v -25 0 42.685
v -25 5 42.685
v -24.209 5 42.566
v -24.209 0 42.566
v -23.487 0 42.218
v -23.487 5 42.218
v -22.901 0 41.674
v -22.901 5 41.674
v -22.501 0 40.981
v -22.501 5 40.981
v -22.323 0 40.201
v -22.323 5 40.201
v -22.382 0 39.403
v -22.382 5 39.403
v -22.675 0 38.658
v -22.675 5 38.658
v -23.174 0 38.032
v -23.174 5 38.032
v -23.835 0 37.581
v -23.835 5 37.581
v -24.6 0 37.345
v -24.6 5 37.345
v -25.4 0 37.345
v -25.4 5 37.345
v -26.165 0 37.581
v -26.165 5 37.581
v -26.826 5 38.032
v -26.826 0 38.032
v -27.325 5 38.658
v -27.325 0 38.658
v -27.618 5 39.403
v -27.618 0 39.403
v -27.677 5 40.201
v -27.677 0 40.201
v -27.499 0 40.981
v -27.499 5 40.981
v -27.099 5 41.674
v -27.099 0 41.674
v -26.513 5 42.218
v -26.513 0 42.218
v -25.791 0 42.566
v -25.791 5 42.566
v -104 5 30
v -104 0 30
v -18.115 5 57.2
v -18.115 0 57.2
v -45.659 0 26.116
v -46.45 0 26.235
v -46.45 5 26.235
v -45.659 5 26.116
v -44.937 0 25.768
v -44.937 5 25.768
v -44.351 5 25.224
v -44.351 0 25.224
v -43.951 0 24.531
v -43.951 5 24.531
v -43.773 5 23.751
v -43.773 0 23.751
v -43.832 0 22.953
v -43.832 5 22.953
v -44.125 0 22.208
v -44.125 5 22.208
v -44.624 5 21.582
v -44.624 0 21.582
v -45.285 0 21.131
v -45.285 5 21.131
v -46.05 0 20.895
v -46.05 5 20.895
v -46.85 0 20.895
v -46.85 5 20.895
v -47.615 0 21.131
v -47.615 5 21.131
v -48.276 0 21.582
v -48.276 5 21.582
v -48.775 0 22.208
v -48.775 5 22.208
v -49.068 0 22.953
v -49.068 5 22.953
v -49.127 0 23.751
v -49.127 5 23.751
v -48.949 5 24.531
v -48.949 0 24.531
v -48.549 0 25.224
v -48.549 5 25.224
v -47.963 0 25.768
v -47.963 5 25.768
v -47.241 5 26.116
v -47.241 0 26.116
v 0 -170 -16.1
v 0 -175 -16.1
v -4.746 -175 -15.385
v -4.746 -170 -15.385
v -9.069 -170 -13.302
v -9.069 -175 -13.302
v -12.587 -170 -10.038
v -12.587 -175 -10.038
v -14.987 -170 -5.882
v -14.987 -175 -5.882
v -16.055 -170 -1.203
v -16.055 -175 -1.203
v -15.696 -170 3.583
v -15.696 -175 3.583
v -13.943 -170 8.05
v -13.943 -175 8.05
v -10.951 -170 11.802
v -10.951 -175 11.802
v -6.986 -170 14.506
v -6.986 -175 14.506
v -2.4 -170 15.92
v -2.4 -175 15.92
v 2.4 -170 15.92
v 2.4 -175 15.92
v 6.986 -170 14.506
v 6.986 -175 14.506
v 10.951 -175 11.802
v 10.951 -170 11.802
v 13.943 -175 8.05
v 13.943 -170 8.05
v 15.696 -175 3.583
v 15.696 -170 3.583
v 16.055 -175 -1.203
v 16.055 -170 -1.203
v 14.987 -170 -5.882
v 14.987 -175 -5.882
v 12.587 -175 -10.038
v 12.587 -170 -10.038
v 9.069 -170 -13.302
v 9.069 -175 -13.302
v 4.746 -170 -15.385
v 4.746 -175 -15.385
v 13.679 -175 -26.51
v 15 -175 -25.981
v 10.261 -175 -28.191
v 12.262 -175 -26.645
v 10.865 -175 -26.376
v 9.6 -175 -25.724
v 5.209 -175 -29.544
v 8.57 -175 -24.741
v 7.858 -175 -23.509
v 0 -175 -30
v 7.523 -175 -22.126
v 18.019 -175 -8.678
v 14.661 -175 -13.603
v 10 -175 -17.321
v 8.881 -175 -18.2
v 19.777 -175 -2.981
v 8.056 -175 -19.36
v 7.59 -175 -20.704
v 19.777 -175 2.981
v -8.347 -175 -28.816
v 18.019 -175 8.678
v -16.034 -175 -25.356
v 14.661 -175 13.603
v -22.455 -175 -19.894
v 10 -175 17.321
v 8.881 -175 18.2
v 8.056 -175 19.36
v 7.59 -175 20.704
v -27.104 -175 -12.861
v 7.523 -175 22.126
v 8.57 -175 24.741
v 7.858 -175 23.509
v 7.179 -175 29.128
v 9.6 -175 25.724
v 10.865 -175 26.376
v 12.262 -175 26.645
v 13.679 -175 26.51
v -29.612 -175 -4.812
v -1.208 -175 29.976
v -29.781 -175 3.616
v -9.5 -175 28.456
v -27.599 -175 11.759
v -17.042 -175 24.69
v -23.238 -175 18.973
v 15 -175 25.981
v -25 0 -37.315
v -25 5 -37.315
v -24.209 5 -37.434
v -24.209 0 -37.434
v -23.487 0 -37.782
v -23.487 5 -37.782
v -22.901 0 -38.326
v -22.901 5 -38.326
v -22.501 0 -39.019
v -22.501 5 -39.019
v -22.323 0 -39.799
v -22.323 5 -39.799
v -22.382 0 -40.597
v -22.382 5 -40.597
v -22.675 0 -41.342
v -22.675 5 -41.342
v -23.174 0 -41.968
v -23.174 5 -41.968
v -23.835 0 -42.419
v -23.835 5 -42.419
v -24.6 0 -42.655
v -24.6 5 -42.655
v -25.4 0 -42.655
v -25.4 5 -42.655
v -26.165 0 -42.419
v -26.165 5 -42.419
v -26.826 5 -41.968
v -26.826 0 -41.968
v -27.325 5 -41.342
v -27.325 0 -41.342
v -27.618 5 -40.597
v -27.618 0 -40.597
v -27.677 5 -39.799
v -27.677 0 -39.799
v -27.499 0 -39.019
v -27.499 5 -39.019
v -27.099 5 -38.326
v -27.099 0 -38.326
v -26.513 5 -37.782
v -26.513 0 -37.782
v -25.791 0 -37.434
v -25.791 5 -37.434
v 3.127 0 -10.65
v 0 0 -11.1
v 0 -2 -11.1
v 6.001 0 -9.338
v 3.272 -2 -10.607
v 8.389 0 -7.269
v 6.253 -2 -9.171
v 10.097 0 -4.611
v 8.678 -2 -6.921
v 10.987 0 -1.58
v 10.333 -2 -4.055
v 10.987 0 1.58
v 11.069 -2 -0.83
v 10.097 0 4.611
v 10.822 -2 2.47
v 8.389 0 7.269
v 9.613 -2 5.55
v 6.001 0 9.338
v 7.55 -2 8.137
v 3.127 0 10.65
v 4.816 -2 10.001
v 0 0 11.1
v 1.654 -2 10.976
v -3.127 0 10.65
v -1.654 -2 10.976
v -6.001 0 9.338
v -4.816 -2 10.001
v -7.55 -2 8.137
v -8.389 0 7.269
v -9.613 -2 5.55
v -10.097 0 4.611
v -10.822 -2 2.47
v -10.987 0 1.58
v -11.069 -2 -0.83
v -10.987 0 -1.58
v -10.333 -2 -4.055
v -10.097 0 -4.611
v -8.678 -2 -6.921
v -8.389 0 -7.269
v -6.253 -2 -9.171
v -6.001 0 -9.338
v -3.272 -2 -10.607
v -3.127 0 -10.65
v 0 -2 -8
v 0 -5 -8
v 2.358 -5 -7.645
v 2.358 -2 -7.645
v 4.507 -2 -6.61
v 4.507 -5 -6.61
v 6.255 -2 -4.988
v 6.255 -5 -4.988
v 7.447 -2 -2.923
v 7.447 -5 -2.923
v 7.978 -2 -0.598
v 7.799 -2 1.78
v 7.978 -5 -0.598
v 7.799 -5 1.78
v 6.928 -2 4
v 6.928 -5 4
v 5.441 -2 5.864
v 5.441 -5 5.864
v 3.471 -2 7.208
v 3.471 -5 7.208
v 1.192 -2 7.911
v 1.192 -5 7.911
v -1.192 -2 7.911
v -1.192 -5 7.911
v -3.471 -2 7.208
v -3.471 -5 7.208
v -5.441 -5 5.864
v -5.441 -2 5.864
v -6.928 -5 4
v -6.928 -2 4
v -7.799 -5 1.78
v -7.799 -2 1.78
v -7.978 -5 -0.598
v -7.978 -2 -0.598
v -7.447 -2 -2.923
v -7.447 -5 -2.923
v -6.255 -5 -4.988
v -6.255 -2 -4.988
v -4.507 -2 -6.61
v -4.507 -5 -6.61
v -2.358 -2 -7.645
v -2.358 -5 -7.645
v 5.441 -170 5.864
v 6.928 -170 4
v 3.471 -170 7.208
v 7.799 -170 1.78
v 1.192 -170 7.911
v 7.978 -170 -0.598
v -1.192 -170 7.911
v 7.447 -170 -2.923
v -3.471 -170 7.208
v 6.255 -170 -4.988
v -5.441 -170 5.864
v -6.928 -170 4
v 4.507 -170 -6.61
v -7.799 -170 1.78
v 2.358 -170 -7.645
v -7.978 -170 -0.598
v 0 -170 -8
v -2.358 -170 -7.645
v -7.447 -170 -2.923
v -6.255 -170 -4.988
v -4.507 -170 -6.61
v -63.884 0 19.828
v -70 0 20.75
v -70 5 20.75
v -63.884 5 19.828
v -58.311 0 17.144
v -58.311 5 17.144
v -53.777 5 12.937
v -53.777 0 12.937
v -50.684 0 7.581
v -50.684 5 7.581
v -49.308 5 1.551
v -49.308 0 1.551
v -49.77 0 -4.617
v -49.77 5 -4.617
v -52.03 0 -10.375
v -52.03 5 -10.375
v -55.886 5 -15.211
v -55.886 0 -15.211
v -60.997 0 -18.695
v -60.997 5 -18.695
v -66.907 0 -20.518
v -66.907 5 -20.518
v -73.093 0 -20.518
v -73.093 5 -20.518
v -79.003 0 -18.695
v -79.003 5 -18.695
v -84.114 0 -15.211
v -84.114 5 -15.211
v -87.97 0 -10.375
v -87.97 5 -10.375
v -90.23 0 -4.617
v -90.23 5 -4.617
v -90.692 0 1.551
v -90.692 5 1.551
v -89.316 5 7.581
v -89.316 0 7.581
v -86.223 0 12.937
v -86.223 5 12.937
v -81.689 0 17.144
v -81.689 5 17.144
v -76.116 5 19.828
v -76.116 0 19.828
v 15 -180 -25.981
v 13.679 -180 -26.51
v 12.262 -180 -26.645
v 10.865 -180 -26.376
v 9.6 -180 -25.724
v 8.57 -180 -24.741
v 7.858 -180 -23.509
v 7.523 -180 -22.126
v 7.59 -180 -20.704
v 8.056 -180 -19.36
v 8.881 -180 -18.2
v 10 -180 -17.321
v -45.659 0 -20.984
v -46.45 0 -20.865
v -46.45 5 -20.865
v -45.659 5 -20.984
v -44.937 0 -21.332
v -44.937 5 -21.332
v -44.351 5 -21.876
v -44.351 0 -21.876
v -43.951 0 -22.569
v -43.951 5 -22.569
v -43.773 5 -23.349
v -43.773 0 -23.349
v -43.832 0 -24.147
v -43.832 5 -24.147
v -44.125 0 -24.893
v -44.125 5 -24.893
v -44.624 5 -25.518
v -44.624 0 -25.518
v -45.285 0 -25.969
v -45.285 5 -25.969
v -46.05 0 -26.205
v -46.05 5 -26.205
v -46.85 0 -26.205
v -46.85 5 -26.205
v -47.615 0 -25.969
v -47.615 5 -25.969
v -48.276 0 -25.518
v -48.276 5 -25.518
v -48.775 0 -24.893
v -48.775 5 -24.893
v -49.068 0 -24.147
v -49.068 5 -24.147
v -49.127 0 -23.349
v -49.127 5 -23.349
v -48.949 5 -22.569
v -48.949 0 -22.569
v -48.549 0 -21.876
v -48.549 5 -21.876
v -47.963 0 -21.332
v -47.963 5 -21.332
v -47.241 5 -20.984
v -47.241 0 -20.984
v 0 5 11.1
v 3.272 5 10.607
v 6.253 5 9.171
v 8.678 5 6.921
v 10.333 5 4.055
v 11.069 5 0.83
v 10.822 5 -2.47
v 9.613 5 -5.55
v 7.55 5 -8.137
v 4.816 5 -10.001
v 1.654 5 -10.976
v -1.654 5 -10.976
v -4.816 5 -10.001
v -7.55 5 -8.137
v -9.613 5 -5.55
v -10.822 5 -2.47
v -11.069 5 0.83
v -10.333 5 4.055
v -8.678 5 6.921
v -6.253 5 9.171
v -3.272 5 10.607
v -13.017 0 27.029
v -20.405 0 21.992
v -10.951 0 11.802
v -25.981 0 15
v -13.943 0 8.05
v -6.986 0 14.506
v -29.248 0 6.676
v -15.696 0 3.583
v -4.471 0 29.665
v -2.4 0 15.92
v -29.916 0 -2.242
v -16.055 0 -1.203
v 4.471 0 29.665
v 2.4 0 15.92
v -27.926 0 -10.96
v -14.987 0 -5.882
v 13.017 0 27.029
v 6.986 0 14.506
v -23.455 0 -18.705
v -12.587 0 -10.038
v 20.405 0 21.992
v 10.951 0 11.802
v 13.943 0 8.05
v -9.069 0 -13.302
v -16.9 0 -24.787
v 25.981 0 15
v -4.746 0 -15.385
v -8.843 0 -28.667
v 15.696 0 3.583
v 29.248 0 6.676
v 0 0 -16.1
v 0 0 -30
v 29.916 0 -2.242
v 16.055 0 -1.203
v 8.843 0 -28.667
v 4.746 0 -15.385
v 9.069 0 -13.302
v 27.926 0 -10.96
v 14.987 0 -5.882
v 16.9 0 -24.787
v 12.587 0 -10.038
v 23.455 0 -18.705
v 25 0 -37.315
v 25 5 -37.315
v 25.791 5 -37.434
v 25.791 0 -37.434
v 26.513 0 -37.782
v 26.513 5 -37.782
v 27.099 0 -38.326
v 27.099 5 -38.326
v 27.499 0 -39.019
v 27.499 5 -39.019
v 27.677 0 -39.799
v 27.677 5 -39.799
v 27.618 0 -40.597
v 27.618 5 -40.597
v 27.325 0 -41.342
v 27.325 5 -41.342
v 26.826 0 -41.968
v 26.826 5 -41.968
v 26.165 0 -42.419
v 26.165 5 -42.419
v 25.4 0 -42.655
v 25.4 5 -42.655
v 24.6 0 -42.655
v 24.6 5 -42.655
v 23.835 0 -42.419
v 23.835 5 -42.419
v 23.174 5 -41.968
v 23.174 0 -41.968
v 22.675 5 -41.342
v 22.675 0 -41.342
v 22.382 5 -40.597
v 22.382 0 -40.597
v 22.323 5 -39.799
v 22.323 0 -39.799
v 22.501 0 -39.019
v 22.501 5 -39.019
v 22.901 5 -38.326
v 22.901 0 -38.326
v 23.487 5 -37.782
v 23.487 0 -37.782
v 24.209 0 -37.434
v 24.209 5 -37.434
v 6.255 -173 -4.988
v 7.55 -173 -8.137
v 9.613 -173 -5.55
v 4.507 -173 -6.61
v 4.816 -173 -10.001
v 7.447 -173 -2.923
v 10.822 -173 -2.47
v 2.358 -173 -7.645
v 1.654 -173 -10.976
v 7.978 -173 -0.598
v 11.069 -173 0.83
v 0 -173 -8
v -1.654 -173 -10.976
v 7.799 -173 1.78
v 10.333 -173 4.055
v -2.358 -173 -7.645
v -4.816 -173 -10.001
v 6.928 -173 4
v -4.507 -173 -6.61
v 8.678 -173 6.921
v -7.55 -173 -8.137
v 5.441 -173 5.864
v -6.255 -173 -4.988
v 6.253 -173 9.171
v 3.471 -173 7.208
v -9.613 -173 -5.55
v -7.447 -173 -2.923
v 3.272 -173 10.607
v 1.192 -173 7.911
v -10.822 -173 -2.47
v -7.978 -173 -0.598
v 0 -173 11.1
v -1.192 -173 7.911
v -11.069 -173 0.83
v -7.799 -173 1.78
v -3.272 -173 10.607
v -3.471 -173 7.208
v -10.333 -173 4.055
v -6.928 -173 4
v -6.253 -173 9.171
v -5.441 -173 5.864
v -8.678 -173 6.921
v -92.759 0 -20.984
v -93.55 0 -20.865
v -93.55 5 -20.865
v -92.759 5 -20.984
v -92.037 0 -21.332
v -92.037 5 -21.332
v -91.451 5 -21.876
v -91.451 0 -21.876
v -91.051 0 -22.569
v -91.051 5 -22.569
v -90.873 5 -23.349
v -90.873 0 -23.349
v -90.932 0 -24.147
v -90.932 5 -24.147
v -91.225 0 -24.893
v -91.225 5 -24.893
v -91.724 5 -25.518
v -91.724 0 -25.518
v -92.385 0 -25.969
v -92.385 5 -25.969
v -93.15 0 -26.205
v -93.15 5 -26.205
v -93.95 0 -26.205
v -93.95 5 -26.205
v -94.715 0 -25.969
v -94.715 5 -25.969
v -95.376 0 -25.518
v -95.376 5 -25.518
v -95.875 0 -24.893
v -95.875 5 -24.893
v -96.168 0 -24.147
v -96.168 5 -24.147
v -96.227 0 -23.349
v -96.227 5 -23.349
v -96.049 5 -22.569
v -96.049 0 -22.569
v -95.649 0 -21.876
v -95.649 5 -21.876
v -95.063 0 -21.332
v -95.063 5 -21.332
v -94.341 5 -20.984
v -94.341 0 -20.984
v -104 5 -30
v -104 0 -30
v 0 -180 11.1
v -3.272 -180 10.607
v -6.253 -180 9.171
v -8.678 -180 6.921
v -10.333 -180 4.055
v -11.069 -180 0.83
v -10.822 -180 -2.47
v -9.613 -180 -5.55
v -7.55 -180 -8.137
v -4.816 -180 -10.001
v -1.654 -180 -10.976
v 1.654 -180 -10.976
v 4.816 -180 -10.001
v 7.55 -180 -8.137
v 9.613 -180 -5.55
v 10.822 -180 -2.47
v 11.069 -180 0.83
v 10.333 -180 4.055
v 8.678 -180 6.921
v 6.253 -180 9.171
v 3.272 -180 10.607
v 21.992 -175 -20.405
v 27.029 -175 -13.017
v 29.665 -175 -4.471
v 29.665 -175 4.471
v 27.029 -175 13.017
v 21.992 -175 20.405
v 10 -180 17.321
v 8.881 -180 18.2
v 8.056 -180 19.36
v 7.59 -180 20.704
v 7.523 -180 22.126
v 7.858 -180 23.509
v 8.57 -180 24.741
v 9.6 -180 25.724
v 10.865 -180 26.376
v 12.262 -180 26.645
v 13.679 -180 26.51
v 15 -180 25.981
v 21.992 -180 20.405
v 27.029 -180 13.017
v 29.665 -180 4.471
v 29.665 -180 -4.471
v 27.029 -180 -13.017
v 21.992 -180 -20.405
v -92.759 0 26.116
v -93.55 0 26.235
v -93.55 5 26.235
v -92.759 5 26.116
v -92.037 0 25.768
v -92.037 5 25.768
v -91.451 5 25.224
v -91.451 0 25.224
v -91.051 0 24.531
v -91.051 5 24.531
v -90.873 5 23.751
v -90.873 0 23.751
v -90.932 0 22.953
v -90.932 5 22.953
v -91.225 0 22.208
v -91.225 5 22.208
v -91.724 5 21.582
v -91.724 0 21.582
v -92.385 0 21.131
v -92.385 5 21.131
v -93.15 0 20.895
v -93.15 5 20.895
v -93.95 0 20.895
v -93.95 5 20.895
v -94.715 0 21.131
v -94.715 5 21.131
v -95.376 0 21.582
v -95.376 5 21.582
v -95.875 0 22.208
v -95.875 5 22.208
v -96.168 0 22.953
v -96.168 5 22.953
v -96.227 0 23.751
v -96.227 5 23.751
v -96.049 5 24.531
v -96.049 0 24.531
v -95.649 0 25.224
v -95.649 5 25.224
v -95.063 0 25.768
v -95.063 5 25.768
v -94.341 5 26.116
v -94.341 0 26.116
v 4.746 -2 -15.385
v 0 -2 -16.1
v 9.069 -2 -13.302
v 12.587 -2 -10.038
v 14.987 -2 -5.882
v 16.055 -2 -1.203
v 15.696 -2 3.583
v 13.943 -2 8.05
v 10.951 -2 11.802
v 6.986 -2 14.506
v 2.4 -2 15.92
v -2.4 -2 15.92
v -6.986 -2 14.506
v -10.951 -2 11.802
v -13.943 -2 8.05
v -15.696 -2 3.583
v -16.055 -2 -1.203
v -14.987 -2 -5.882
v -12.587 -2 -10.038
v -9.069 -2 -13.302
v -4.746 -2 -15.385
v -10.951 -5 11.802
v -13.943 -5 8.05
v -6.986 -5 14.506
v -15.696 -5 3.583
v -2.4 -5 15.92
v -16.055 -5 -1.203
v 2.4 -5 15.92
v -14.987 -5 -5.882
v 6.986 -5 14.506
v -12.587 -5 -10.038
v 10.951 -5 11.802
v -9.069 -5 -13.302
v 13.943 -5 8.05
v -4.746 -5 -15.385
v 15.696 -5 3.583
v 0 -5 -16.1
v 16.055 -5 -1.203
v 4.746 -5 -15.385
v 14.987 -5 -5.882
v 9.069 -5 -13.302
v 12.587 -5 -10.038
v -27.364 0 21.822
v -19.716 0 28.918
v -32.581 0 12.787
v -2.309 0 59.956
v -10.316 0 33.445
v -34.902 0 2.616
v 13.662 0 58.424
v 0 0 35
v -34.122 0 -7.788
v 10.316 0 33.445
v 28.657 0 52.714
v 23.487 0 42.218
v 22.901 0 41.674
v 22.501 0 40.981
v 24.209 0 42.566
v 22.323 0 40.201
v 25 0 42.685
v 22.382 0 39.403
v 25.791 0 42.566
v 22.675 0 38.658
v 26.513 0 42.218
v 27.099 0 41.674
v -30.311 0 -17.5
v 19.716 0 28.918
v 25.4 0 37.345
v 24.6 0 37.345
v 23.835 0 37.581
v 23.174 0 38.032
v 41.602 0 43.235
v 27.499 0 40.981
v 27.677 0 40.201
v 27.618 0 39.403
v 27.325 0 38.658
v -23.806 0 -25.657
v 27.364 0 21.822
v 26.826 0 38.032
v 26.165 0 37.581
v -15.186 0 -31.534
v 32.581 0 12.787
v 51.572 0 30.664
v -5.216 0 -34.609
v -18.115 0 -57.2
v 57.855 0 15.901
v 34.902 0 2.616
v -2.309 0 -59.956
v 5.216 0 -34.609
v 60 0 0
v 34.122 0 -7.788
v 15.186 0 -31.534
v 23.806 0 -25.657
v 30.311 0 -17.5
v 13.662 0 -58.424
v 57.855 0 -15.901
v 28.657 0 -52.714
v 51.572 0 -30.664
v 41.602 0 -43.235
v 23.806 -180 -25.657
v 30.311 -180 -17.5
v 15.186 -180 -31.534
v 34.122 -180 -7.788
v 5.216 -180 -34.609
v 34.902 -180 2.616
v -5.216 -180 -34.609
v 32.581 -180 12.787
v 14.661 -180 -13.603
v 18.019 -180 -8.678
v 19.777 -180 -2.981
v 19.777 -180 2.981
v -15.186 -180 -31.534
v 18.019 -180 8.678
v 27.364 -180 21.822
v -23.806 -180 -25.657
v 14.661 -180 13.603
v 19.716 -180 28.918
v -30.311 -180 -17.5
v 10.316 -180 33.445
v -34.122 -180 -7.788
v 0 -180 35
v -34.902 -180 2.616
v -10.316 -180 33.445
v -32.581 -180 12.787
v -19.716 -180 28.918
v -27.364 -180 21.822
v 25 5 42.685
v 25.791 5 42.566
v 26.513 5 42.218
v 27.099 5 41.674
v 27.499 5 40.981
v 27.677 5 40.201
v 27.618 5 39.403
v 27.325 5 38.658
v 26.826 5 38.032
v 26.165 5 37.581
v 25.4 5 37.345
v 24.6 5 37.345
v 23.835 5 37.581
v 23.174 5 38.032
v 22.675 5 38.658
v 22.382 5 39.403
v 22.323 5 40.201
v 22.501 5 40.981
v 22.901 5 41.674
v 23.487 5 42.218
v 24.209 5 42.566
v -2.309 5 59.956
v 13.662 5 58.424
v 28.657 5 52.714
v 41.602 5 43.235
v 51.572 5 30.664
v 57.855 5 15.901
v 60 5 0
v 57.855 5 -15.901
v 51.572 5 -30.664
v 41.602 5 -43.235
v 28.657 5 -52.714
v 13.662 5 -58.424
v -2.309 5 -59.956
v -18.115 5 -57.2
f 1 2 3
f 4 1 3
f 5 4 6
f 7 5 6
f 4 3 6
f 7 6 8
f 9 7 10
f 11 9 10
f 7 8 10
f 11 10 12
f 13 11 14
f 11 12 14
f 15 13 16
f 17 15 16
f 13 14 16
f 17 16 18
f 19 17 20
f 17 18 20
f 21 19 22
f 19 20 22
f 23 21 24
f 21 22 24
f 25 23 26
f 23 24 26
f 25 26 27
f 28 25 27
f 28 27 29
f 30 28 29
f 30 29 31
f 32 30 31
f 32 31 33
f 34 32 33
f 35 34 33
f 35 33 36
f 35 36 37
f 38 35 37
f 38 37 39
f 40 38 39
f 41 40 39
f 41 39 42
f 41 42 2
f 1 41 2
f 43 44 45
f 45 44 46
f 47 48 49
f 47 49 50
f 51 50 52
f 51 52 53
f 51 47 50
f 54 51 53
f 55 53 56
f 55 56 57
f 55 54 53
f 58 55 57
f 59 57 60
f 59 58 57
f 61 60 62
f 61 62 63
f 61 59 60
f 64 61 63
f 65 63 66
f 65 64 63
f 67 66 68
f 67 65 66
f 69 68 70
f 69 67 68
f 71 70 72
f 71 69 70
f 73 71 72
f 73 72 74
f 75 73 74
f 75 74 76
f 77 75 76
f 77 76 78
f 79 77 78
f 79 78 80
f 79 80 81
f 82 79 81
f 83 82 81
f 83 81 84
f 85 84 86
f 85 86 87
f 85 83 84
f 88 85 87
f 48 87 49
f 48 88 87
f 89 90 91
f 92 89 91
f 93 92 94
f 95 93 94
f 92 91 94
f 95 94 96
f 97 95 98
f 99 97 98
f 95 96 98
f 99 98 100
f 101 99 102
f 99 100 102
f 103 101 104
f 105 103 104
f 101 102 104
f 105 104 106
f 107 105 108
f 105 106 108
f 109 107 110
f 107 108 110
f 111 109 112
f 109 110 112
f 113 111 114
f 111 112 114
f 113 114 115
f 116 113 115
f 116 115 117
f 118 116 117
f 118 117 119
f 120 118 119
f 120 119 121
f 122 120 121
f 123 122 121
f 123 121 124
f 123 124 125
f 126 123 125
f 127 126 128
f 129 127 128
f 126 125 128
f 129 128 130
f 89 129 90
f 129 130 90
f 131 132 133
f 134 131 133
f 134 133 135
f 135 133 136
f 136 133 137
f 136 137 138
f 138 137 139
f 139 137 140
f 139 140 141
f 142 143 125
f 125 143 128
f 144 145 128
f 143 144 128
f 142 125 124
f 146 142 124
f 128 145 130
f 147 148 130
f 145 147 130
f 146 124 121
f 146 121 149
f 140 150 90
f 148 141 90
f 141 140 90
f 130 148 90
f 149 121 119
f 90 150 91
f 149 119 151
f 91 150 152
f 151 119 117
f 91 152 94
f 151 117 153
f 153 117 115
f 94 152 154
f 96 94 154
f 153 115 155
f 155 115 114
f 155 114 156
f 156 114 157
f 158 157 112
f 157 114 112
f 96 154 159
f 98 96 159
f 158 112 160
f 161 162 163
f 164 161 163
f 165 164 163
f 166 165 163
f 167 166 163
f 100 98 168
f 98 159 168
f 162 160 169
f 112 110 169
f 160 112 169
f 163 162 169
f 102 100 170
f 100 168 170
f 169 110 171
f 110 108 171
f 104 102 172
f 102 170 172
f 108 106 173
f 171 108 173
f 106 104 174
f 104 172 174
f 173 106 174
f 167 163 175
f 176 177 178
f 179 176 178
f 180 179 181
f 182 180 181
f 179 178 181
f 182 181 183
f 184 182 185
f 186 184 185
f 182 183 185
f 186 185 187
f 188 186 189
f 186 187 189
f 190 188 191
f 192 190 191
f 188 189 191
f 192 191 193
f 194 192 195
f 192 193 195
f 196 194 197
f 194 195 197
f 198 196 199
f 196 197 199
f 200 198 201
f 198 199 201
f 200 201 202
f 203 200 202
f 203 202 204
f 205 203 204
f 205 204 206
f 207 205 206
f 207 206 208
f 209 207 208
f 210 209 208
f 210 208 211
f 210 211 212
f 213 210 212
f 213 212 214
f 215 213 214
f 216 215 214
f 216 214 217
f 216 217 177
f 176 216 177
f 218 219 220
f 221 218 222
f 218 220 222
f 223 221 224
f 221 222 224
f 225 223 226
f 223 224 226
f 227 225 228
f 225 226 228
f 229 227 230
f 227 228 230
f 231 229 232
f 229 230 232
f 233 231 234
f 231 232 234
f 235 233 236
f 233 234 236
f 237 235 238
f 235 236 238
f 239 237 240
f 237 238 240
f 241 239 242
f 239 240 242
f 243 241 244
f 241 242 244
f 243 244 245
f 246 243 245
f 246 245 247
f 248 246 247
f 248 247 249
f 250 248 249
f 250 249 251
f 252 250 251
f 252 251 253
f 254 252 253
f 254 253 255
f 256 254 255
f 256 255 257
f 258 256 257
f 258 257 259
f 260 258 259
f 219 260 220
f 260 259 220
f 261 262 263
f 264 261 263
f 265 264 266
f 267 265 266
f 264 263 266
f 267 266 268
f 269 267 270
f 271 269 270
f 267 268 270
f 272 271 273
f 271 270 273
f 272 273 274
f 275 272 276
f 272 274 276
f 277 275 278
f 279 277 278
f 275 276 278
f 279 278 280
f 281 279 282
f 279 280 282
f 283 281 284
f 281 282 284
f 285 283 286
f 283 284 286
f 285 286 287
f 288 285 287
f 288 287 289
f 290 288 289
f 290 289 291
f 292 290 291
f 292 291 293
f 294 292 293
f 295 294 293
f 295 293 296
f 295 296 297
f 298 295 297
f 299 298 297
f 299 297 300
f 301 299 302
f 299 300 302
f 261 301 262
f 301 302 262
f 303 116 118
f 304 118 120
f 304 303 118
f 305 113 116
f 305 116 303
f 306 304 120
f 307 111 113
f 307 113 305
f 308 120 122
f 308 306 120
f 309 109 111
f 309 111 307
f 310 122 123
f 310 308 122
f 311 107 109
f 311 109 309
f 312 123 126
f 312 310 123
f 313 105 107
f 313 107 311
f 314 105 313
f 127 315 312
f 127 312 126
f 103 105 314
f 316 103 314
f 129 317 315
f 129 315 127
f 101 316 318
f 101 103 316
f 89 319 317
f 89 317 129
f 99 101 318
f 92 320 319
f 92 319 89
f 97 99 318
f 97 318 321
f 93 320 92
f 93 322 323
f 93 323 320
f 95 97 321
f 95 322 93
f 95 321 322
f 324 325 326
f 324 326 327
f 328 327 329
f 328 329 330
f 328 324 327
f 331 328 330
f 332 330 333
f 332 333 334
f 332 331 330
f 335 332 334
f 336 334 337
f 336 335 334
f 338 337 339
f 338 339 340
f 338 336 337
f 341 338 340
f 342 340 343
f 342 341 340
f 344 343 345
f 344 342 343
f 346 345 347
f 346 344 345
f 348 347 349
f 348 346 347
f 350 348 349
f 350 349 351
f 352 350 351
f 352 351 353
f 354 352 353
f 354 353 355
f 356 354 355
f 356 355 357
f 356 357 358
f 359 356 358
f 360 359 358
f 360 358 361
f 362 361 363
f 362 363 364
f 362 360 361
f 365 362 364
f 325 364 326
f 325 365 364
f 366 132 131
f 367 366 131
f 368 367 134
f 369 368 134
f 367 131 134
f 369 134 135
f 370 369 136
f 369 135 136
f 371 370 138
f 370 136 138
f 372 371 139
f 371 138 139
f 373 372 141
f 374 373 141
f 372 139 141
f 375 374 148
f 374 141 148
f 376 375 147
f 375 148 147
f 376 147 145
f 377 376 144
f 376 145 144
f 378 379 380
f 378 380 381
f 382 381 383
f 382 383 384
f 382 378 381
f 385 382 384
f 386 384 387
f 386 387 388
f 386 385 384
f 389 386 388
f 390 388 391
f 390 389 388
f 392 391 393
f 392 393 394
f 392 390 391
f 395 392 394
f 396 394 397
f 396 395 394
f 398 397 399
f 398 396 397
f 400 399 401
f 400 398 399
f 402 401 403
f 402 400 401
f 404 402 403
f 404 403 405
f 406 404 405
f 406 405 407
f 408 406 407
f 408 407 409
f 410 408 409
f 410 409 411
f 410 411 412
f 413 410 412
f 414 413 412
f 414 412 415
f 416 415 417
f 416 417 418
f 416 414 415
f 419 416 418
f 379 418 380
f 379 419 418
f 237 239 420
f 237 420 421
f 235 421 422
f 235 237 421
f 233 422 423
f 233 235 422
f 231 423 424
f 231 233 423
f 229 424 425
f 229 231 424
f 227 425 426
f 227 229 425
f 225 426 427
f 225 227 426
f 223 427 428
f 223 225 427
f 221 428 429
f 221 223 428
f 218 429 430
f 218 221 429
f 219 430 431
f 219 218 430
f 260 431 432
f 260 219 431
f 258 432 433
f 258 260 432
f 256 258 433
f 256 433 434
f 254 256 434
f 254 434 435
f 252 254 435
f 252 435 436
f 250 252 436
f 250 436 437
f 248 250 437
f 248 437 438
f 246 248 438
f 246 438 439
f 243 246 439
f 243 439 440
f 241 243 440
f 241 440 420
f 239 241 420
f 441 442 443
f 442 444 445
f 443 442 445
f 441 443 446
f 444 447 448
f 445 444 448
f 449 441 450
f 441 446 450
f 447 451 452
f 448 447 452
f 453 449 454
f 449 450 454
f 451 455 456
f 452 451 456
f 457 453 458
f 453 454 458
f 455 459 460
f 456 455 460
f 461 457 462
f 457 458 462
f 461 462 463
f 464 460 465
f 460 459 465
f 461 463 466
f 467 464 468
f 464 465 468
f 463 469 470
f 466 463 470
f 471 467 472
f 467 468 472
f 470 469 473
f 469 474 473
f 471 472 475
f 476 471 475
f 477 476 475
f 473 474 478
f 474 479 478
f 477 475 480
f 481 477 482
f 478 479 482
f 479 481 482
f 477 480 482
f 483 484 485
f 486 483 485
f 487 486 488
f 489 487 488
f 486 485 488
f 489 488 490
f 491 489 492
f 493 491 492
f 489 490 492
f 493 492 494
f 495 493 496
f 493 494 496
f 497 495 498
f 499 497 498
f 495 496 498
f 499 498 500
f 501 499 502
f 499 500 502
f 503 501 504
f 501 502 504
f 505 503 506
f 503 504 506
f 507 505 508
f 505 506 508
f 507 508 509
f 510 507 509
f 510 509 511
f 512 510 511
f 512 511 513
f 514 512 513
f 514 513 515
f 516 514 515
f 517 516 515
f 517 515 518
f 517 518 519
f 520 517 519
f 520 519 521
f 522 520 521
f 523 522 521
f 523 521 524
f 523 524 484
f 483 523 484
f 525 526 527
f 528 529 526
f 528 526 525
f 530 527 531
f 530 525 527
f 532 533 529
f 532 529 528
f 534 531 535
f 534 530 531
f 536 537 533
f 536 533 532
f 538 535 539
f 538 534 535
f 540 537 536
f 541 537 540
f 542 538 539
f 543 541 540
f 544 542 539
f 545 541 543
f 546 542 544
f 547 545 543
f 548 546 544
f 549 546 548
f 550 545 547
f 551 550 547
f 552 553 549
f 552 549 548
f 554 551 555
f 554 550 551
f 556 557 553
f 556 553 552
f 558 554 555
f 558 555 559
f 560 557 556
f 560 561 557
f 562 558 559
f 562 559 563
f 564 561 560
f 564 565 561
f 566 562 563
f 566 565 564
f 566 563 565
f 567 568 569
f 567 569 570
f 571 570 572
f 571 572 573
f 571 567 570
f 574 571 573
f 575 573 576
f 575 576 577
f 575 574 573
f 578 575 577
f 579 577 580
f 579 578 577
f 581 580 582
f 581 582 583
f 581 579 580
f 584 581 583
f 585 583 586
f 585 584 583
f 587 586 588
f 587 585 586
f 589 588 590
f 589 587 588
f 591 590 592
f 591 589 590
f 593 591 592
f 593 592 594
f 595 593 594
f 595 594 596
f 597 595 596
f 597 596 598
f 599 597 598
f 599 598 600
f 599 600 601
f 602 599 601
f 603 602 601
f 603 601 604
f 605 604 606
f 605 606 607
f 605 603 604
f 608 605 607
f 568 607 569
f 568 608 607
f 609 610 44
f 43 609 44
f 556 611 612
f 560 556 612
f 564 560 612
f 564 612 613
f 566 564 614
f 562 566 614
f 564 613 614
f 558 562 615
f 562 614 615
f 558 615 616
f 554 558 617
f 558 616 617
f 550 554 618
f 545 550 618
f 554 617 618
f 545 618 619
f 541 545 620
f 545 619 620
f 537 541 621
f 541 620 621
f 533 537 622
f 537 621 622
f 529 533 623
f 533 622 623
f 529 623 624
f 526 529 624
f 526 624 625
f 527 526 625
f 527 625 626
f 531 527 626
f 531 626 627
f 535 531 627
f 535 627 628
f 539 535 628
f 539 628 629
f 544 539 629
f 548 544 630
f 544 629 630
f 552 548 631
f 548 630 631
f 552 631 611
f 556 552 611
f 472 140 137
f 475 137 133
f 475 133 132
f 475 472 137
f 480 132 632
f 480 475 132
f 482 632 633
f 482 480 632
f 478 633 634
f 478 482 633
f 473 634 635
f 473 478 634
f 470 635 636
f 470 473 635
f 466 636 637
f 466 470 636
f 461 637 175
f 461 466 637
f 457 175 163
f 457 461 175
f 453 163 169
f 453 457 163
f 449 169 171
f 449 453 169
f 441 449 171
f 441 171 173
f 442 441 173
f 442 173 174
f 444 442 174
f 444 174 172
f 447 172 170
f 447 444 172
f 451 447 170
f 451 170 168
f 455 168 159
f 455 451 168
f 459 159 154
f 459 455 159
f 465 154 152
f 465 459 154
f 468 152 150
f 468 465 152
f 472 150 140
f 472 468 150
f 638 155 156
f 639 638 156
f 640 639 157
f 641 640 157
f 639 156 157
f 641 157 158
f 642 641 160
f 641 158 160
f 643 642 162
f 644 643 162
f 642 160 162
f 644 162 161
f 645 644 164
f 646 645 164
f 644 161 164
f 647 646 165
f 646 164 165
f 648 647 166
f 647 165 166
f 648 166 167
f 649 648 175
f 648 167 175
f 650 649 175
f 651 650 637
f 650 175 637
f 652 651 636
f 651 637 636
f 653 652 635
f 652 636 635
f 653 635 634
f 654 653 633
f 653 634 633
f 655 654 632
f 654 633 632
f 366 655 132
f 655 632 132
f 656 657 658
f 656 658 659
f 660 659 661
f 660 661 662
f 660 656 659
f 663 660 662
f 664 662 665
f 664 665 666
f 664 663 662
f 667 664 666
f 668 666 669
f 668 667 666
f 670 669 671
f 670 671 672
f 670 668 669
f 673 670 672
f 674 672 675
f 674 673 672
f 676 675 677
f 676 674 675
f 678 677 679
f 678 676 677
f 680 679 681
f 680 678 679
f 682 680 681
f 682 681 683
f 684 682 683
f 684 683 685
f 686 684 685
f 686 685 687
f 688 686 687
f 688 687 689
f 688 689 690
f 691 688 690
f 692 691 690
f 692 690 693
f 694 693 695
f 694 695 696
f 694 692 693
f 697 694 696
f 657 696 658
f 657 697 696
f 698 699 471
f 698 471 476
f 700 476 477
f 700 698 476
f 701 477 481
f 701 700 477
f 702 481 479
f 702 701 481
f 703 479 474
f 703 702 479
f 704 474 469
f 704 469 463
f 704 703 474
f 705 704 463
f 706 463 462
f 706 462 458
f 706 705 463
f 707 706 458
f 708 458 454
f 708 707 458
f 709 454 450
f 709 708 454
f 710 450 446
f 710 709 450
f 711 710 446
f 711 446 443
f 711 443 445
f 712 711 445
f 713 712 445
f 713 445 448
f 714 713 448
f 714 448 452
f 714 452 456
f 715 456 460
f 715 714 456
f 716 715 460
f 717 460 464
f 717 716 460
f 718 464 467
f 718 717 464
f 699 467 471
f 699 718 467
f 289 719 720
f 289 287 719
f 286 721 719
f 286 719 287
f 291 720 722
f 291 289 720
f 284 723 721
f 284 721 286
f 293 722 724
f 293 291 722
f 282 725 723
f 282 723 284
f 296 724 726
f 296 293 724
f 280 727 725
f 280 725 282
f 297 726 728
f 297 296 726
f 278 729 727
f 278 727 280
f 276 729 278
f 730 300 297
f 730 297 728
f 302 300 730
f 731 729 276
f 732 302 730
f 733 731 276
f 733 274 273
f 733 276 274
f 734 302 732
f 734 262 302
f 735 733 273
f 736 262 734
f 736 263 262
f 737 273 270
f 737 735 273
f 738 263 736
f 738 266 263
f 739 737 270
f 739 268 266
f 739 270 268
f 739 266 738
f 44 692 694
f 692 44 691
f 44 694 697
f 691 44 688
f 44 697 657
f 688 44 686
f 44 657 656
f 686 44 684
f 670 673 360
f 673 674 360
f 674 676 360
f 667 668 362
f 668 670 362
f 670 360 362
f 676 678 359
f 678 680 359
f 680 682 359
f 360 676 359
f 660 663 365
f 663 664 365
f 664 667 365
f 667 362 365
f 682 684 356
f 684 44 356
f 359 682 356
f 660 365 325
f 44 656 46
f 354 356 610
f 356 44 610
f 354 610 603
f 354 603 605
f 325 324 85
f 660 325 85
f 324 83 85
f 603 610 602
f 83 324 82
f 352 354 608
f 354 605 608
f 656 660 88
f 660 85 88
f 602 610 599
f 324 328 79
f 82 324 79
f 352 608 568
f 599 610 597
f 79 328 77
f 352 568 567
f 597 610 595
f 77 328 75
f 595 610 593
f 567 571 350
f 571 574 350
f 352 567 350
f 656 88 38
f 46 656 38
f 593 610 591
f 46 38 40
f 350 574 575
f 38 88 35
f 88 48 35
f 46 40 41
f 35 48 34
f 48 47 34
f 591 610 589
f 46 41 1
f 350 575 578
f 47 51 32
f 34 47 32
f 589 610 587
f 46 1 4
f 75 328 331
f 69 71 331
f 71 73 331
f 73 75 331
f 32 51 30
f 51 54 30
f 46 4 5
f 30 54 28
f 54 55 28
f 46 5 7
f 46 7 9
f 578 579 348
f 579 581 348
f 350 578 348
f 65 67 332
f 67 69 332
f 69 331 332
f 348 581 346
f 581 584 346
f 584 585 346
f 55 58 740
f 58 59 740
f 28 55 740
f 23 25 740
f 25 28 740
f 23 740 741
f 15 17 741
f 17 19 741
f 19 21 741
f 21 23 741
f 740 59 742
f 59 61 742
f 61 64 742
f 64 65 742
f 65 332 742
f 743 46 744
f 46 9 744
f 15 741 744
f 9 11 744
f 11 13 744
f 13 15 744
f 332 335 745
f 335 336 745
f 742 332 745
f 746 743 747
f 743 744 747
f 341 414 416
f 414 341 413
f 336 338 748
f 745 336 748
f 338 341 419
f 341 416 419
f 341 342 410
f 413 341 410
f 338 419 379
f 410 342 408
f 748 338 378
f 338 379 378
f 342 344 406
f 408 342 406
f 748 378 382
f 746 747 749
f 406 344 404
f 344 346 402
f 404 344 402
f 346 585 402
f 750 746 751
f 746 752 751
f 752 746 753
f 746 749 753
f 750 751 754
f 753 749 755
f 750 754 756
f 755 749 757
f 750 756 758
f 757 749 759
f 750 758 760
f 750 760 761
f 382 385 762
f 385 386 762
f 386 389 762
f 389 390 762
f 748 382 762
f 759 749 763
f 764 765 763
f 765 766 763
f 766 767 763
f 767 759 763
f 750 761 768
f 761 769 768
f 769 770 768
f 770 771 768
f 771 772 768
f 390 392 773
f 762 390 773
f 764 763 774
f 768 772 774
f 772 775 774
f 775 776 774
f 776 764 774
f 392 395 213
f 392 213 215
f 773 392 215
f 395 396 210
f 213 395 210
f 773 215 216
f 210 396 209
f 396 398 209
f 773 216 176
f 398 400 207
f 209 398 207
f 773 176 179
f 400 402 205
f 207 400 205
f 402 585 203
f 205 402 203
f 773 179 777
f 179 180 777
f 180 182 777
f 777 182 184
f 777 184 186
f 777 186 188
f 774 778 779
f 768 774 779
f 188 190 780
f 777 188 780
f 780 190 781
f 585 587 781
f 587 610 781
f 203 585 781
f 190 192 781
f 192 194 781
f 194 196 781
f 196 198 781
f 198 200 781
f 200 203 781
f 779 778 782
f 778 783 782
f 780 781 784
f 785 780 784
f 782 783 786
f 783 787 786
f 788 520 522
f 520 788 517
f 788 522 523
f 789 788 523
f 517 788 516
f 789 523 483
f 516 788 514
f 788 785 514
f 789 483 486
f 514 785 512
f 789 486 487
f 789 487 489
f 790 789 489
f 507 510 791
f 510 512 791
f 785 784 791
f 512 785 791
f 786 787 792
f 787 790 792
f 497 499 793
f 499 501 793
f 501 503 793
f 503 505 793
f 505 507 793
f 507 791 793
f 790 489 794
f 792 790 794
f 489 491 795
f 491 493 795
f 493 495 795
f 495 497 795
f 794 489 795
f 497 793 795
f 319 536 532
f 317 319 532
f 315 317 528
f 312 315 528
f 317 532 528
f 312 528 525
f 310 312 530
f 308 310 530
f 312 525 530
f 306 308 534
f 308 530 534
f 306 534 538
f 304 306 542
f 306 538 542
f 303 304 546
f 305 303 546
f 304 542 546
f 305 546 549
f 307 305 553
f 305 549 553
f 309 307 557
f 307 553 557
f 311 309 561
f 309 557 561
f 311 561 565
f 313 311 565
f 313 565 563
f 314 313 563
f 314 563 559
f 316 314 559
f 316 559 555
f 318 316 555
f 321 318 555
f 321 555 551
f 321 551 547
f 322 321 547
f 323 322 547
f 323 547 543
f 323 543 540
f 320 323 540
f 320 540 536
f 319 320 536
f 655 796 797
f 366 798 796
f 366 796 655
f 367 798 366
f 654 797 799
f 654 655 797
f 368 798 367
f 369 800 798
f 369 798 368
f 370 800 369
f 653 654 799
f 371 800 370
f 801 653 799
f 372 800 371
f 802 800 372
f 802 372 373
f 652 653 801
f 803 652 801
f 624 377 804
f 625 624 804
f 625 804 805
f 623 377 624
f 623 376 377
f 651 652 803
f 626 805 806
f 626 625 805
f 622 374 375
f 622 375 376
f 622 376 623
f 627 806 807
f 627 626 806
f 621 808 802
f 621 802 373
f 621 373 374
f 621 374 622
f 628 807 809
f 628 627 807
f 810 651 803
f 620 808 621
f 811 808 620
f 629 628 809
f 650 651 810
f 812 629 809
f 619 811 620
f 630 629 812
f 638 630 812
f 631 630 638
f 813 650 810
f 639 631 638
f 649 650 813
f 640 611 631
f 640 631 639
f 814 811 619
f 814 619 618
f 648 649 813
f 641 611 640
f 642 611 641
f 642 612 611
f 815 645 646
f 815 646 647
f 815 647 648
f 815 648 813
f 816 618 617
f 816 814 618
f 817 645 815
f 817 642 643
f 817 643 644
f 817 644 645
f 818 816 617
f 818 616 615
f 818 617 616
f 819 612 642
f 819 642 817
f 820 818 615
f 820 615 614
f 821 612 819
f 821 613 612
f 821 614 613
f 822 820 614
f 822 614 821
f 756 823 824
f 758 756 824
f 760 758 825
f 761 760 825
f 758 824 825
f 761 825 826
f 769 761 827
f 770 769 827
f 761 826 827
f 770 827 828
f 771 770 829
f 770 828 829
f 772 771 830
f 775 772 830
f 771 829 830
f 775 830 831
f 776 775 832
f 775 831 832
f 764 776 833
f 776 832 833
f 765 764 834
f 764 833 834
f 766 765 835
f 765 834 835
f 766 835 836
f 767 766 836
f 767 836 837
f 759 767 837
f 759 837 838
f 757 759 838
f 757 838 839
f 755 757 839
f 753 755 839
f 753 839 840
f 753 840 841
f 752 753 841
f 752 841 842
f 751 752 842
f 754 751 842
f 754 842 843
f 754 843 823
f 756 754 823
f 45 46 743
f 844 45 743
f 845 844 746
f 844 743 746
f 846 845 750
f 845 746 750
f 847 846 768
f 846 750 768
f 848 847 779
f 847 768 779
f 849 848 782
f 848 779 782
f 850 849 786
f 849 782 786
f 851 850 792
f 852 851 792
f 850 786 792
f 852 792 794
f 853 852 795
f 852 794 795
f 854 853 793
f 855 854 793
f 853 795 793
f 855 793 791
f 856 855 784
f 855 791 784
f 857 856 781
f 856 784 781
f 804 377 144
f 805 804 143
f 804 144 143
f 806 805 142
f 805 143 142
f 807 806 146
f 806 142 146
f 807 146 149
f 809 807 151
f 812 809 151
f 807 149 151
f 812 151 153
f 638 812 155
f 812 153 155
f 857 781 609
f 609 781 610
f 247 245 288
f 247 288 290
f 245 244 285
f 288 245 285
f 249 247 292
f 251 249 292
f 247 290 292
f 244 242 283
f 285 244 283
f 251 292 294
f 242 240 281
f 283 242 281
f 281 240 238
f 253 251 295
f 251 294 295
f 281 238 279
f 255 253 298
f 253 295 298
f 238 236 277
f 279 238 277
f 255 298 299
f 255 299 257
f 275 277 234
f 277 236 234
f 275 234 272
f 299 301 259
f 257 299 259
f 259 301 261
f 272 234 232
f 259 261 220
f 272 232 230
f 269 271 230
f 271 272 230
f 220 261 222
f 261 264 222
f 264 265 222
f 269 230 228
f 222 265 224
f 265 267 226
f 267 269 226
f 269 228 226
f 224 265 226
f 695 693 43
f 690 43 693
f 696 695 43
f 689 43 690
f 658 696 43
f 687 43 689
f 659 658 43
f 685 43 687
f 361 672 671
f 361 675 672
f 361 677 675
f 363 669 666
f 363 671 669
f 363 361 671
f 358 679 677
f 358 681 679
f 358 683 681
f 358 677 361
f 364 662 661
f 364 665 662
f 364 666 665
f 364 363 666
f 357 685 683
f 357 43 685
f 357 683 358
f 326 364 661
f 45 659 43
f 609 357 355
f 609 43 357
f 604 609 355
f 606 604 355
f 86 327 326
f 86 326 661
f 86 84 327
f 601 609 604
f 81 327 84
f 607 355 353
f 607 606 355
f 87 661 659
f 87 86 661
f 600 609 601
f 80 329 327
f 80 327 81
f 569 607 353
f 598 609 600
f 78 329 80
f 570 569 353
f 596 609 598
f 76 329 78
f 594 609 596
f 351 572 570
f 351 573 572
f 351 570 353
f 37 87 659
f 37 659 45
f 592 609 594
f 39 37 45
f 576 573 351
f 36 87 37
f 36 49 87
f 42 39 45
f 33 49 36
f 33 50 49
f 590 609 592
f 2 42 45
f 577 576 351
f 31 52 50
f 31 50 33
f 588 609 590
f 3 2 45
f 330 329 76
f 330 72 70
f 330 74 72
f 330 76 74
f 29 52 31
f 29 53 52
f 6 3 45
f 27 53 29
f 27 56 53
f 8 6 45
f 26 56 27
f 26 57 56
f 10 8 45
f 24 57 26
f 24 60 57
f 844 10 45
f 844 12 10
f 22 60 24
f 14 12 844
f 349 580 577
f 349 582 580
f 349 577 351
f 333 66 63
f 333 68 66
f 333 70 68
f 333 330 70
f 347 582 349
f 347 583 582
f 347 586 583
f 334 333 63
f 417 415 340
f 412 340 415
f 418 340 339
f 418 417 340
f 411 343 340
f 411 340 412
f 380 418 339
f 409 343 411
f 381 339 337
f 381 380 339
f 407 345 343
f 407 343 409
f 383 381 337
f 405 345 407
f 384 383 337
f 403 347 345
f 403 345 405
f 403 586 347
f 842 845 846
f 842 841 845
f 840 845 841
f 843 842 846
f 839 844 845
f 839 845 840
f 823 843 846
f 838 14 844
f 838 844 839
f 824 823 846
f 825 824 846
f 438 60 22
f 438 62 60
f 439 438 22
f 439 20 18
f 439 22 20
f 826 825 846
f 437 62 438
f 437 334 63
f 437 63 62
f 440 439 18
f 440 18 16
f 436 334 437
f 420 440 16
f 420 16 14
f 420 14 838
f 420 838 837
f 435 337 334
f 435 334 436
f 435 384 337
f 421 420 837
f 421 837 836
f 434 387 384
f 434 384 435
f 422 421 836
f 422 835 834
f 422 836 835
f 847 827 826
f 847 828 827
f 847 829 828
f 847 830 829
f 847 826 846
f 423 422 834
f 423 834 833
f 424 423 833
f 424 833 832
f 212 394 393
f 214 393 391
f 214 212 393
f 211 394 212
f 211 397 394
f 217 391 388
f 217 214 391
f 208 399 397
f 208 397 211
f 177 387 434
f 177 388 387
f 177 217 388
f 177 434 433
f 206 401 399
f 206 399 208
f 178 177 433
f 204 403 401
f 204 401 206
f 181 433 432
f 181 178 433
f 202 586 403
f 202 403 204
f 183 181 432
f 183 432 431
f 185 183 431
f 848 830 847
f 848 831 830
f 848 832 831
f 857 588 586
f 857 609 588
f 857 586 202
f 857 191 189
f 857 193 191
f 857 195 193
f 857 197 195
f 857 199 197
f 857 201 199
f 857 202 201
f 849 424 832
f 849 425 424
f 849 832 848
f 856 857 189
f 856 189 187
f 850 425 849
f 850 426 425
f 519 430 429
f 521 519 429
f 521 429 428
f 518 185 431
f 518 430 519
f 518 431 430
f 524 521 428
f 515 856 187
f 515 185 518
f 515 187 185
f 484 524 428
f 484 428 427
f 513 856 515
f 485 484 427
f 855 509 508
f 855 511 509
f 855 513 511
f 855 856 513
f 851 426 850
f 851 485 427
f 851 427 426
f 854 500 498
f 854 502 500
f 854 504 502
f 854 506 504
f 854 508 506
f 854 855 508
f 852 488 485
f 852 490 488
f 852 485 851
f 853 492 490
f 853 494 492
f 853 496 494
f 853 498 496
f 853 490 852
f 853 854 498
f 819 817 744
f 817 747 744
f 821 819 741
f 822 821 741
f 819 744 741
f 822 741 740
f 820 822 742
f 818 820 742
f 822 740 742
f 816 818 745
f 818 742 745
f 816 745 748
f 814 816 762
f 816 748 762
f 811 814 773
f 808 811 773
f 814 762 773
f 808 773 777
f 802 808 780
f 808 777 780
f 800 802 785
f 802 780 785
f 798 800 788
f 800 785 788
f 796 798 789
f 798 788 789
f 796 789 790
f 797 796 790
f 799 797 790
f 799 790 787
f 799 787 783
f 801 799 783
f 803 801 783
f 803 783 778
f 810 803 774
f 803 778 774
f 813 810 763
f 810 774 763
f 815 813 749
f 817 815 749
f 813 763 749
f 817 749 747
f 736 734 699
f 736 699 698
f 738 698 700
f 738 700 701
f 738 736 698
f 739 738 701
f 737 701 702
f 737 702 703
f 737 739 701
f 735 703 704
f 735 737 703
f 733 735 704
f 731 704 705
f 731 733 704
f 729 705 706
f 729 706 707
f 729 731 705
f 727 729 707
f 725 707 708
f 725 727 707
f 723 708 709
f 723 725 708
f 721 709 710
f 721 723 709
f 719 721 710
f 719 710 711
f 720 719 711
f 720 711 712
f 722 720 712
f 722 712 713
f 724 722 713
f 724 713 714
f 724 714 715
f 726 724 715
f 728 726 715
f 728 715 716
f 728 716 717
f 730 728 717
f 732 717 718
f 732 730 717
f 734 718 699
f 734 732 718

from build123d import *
from build123d.topology import SkipClean

# Parameters (mm, degrees)
SKETCH2_R           = 2.685
SKETCH2_R_2         = 11.1
SKETCH2_R_3         = 20.75
BOSS_EXTRUDE1_DEPTH = 5
SKETCH3_R           = 35
SKETCH3_R_2         = 30
BOSS_EXTRUDE2_DEPTH = 175
SKETCH4_R           = 35
BOSS_EXTRUDE3_DEPTH = 5
CUT_EXTRUDE3_START  = -6
CUT_EXTRUDE3_DEPTH  = 6
SKETCH10_R          = 16.1
BOSS_EXTRUDE5_DEPTH = 5
SKETCH5_R           = 11.1
CUT_EXTRUDE7_DEPTH  = 7
CUT_EXTRUDE8_REACH  = 216.709
SKETCH11_R          = 8
BOSS_EXTRUDE6_START = 2
SKETCH13_R          = 16.1
SKETCH13_R_2        = 11.1
BOSS_EXTRUDE6_DEPTH = 2
BOSS_EXTRUDE7_START = 3
SKETCH14_R          = 16.1
SKETCH14_R_2        = 8
BOSS_EXTRUDE7_DEPTH = 3
SKETCH15_R          = 2.685
CUT_EXTRUDE9_DEPTH  = 221.547047


with BuildPart() as part:
    # Sketch2 → Boss-Extrude1 (new body)
    with BuildSketch(Plane(origin=(0, 0, 0), x_dir=(1, 0, 0), z_dir=(0, 1, 0))):
        with BuildLine():
            Line((-104, -30), (-18.115404, -57.199931))
            ThreePointArc((-18.115404, -57.199931), (60, 0), (-18.115404, 57.199931))
            Line((-18.115404, 57.199931), (-104, 30))
            Line((-104, 30), (-104, -30))
        make_face()
        with Locations(Location((-93.55, 23.55, 0), (0, 0, 270))):
            Circle(SKETCH2_R, mode=Mode.SUBTRACT)
        with Locations(Location((-46.45, 23.55, 0), (0, 0, 270))):
            Circle(SKETCH2_R, mode=Mode.SUBTRACT)
        with Locations(Location((-93.55, -23.55, 0), (0, 0, 270))):
            Circle(SKETCH2_R, mode=Mode.SUBTRACT)
        with Locations(Location((-46.45, -23.55, 0), (0, 0, 270))):
            Circle(SKETCH2_R, mode=Mode.SUBTRACT)
        with Locations(Location((0, 0, 0), (0, 0, 270))):
            Circle(SKETCH2_R_2, mode=Mode.SUBTRACT)
        with Locations(Location((-70, 0, 0), (0, 0, 270))):
            Circle(SKETCH2_R_3, mode=Mode.SUBTRACT)
    extrude(amount=BOSS_EXTRUDE1_DEPTH)

    # Sketch3 → Boss-Extrude2 (add)
    with BuildSketch(Plane.XZ):
        with Locations(Location((0, 0, 0), (0, 0, 90))):
            Circle(SKETCH3_R)
        with Locations(Location((0, 0, 0), (0, 0, 270))):
            Circle(SKETCH3_R_2, mode=Mode.SUBTRACT)
    extrude(amount=BOSS_EXTRUDE2_DEPTH)

    # Sketch4 → Boss-Extrude3 (add)
    with BuildSketch(Plane.XZ.offset(175)):
        with Locations(Location((0, 0, 0), (0, 0, 90))):
            Circle(SKETCH4_R)
    extrude(amount=BOSS_EXTRUDE3_DEPTH)

    # Sketch6 → Cut-Extrude3 (cut)
    with SkipClean():  # the faces are left unmerged after this step: merging them gives an invalid solid
        with BuildSketch(Plane.XZ.offset(180).offset(CUT_EXTRUDE3_START)):
            with BuildLine():
                ThreePointArc((10, -17.320508), (20, 0), (10, 17.320508))
                ThreePointArc((10, 17.320508), (8.169873, 24.150635), (15, 25.980762))
                ThreePointArc((15, 25.980762), (30, 0), (15, -25.980762))
                ThreePointArc((15, -25.980762), (8.169873, -24.150635), (10, -17.320508))
            make_face()
        extrude(amount=CUT_EXTRUDE3_DEPTH, mode=Mode.SUBTRACT)

    # Sketch10 → Boss-Extrude5 (add)
    with SkipClean():  # the faces are left unmerged after this step: merging them gives an invalid solid
        with BuildSketch(Plane(origin=(0, -175, 0), x_dir=(1, 0, 0), z_dir=(0, 1, 0))):
            with Locations(Location((0, 0, 0), (0, 0, 90))):
                Circle(SKETCH10_R)
        extrude(amount=BOSS_EXTRUDE5_DEPTH)

    # Sketch5 → Cut-Extrude7 (cut)
    with SkipClean():  # the faces are left unmerged after this step: merging them gives an invalid solid
        with BuildSketch(Plane.XZ.offset(180)):
            with Locations(Location((0, 0, 0), (0, 0, 90))):
                Circle(SKETCH5_R)
        extrude(amount=-CUT_EXTRUDE7_DEPTH, mode=Mode.SUBTRACT)

    # Sketch11 → Cut-Extrude8 (cut, up to next)
    with BuildSketch(Plane.XZ.offset(173), mode=Mode.PRIVATE) as cut_extrude8_sk1:
        with Locations(Location((0, 0, 0), (0, 0, 270))):
            Circle(SKETCH11_R)
    cut_extrude8_tool1 = extrude(cut_extrude8_sk1.sketch, amount=-CUT_EXTRUDE8_REACH, mode=Mode.PRIVATE) & part.part
    add(cut_extrude8_tool1.solids().sort_by_distance((0, -173, 0))[0], mode=Mode.SUBTRACT)

    # Sketch13 → Boss-Extrude6 (add)
    with SkipClean():  # the faces are left unmerged after this step: merging them gives an invalid solid
        with BuildSketch(Plane.XZ.offset(BOSS_EXTRUDE6_START)):
            with Locations(Location((0, 0, 0), (0, 0, 270))):
                Circle(SKETCH13_R)
            with Locations(Location((0, 0, 0), (0, 0, 270))):
                Circle(SKETCH13_R_2, mode=Mode.SUBTRACT)
        extrude(amount=-BOSS_EXTRUDE6_DEPTH)

    # Sketch14 → Boss-Extrude7 (add)
    with SkipClean():  # the faces are left unmerged after this step: merging them gives an invalid solid
        with BuildSketch(Plane.XZ.offset(2).offset(BOSS_EXTRUDE7_START)):
            with Locations(Location((0, 0, 0), (0, 0, 270))):
                Circle(SKETCH14_R)
            with Locations(Location((0, 0, 0), (0, 0, 270))):
                Circle(SKETCH14_R_2, mode=Mode.SUBTRACT)
        extrude(amount=-BOSS_EXTRUDE7_DEPTH)

    # Sketch15 → Cut-Extrude9 (cut, through all)
    with SkipClean():  # the faces are left unmerged after this step: merging them gives an invalid solid
        with BuildSketch(Plane(origin=(0, 5, 0), x_dir=(1, 0, 0), z_dir=(0, 1, 0))):
            with Locations(Location((-25, 40, 0), (0, 0, 270))):
                Circle(SKETCH15_R)
            with Locations(Location((25, 40, 0), (0, 0, 270))):
                Circle(SKETCH15_R)
            with Locations(Location((25, -40, 0), (0, 0, 270))):
                Circle(SKETCH15_R)
            with Locations(Location((-25, -40, 0), (0, 0, 270))):
                Circle(SKETCH15_R)
        extrude(amount=-CUT_EXTRUDE9_DEPTH, mode=Mode.SUBTRACT)


solid = part.part
